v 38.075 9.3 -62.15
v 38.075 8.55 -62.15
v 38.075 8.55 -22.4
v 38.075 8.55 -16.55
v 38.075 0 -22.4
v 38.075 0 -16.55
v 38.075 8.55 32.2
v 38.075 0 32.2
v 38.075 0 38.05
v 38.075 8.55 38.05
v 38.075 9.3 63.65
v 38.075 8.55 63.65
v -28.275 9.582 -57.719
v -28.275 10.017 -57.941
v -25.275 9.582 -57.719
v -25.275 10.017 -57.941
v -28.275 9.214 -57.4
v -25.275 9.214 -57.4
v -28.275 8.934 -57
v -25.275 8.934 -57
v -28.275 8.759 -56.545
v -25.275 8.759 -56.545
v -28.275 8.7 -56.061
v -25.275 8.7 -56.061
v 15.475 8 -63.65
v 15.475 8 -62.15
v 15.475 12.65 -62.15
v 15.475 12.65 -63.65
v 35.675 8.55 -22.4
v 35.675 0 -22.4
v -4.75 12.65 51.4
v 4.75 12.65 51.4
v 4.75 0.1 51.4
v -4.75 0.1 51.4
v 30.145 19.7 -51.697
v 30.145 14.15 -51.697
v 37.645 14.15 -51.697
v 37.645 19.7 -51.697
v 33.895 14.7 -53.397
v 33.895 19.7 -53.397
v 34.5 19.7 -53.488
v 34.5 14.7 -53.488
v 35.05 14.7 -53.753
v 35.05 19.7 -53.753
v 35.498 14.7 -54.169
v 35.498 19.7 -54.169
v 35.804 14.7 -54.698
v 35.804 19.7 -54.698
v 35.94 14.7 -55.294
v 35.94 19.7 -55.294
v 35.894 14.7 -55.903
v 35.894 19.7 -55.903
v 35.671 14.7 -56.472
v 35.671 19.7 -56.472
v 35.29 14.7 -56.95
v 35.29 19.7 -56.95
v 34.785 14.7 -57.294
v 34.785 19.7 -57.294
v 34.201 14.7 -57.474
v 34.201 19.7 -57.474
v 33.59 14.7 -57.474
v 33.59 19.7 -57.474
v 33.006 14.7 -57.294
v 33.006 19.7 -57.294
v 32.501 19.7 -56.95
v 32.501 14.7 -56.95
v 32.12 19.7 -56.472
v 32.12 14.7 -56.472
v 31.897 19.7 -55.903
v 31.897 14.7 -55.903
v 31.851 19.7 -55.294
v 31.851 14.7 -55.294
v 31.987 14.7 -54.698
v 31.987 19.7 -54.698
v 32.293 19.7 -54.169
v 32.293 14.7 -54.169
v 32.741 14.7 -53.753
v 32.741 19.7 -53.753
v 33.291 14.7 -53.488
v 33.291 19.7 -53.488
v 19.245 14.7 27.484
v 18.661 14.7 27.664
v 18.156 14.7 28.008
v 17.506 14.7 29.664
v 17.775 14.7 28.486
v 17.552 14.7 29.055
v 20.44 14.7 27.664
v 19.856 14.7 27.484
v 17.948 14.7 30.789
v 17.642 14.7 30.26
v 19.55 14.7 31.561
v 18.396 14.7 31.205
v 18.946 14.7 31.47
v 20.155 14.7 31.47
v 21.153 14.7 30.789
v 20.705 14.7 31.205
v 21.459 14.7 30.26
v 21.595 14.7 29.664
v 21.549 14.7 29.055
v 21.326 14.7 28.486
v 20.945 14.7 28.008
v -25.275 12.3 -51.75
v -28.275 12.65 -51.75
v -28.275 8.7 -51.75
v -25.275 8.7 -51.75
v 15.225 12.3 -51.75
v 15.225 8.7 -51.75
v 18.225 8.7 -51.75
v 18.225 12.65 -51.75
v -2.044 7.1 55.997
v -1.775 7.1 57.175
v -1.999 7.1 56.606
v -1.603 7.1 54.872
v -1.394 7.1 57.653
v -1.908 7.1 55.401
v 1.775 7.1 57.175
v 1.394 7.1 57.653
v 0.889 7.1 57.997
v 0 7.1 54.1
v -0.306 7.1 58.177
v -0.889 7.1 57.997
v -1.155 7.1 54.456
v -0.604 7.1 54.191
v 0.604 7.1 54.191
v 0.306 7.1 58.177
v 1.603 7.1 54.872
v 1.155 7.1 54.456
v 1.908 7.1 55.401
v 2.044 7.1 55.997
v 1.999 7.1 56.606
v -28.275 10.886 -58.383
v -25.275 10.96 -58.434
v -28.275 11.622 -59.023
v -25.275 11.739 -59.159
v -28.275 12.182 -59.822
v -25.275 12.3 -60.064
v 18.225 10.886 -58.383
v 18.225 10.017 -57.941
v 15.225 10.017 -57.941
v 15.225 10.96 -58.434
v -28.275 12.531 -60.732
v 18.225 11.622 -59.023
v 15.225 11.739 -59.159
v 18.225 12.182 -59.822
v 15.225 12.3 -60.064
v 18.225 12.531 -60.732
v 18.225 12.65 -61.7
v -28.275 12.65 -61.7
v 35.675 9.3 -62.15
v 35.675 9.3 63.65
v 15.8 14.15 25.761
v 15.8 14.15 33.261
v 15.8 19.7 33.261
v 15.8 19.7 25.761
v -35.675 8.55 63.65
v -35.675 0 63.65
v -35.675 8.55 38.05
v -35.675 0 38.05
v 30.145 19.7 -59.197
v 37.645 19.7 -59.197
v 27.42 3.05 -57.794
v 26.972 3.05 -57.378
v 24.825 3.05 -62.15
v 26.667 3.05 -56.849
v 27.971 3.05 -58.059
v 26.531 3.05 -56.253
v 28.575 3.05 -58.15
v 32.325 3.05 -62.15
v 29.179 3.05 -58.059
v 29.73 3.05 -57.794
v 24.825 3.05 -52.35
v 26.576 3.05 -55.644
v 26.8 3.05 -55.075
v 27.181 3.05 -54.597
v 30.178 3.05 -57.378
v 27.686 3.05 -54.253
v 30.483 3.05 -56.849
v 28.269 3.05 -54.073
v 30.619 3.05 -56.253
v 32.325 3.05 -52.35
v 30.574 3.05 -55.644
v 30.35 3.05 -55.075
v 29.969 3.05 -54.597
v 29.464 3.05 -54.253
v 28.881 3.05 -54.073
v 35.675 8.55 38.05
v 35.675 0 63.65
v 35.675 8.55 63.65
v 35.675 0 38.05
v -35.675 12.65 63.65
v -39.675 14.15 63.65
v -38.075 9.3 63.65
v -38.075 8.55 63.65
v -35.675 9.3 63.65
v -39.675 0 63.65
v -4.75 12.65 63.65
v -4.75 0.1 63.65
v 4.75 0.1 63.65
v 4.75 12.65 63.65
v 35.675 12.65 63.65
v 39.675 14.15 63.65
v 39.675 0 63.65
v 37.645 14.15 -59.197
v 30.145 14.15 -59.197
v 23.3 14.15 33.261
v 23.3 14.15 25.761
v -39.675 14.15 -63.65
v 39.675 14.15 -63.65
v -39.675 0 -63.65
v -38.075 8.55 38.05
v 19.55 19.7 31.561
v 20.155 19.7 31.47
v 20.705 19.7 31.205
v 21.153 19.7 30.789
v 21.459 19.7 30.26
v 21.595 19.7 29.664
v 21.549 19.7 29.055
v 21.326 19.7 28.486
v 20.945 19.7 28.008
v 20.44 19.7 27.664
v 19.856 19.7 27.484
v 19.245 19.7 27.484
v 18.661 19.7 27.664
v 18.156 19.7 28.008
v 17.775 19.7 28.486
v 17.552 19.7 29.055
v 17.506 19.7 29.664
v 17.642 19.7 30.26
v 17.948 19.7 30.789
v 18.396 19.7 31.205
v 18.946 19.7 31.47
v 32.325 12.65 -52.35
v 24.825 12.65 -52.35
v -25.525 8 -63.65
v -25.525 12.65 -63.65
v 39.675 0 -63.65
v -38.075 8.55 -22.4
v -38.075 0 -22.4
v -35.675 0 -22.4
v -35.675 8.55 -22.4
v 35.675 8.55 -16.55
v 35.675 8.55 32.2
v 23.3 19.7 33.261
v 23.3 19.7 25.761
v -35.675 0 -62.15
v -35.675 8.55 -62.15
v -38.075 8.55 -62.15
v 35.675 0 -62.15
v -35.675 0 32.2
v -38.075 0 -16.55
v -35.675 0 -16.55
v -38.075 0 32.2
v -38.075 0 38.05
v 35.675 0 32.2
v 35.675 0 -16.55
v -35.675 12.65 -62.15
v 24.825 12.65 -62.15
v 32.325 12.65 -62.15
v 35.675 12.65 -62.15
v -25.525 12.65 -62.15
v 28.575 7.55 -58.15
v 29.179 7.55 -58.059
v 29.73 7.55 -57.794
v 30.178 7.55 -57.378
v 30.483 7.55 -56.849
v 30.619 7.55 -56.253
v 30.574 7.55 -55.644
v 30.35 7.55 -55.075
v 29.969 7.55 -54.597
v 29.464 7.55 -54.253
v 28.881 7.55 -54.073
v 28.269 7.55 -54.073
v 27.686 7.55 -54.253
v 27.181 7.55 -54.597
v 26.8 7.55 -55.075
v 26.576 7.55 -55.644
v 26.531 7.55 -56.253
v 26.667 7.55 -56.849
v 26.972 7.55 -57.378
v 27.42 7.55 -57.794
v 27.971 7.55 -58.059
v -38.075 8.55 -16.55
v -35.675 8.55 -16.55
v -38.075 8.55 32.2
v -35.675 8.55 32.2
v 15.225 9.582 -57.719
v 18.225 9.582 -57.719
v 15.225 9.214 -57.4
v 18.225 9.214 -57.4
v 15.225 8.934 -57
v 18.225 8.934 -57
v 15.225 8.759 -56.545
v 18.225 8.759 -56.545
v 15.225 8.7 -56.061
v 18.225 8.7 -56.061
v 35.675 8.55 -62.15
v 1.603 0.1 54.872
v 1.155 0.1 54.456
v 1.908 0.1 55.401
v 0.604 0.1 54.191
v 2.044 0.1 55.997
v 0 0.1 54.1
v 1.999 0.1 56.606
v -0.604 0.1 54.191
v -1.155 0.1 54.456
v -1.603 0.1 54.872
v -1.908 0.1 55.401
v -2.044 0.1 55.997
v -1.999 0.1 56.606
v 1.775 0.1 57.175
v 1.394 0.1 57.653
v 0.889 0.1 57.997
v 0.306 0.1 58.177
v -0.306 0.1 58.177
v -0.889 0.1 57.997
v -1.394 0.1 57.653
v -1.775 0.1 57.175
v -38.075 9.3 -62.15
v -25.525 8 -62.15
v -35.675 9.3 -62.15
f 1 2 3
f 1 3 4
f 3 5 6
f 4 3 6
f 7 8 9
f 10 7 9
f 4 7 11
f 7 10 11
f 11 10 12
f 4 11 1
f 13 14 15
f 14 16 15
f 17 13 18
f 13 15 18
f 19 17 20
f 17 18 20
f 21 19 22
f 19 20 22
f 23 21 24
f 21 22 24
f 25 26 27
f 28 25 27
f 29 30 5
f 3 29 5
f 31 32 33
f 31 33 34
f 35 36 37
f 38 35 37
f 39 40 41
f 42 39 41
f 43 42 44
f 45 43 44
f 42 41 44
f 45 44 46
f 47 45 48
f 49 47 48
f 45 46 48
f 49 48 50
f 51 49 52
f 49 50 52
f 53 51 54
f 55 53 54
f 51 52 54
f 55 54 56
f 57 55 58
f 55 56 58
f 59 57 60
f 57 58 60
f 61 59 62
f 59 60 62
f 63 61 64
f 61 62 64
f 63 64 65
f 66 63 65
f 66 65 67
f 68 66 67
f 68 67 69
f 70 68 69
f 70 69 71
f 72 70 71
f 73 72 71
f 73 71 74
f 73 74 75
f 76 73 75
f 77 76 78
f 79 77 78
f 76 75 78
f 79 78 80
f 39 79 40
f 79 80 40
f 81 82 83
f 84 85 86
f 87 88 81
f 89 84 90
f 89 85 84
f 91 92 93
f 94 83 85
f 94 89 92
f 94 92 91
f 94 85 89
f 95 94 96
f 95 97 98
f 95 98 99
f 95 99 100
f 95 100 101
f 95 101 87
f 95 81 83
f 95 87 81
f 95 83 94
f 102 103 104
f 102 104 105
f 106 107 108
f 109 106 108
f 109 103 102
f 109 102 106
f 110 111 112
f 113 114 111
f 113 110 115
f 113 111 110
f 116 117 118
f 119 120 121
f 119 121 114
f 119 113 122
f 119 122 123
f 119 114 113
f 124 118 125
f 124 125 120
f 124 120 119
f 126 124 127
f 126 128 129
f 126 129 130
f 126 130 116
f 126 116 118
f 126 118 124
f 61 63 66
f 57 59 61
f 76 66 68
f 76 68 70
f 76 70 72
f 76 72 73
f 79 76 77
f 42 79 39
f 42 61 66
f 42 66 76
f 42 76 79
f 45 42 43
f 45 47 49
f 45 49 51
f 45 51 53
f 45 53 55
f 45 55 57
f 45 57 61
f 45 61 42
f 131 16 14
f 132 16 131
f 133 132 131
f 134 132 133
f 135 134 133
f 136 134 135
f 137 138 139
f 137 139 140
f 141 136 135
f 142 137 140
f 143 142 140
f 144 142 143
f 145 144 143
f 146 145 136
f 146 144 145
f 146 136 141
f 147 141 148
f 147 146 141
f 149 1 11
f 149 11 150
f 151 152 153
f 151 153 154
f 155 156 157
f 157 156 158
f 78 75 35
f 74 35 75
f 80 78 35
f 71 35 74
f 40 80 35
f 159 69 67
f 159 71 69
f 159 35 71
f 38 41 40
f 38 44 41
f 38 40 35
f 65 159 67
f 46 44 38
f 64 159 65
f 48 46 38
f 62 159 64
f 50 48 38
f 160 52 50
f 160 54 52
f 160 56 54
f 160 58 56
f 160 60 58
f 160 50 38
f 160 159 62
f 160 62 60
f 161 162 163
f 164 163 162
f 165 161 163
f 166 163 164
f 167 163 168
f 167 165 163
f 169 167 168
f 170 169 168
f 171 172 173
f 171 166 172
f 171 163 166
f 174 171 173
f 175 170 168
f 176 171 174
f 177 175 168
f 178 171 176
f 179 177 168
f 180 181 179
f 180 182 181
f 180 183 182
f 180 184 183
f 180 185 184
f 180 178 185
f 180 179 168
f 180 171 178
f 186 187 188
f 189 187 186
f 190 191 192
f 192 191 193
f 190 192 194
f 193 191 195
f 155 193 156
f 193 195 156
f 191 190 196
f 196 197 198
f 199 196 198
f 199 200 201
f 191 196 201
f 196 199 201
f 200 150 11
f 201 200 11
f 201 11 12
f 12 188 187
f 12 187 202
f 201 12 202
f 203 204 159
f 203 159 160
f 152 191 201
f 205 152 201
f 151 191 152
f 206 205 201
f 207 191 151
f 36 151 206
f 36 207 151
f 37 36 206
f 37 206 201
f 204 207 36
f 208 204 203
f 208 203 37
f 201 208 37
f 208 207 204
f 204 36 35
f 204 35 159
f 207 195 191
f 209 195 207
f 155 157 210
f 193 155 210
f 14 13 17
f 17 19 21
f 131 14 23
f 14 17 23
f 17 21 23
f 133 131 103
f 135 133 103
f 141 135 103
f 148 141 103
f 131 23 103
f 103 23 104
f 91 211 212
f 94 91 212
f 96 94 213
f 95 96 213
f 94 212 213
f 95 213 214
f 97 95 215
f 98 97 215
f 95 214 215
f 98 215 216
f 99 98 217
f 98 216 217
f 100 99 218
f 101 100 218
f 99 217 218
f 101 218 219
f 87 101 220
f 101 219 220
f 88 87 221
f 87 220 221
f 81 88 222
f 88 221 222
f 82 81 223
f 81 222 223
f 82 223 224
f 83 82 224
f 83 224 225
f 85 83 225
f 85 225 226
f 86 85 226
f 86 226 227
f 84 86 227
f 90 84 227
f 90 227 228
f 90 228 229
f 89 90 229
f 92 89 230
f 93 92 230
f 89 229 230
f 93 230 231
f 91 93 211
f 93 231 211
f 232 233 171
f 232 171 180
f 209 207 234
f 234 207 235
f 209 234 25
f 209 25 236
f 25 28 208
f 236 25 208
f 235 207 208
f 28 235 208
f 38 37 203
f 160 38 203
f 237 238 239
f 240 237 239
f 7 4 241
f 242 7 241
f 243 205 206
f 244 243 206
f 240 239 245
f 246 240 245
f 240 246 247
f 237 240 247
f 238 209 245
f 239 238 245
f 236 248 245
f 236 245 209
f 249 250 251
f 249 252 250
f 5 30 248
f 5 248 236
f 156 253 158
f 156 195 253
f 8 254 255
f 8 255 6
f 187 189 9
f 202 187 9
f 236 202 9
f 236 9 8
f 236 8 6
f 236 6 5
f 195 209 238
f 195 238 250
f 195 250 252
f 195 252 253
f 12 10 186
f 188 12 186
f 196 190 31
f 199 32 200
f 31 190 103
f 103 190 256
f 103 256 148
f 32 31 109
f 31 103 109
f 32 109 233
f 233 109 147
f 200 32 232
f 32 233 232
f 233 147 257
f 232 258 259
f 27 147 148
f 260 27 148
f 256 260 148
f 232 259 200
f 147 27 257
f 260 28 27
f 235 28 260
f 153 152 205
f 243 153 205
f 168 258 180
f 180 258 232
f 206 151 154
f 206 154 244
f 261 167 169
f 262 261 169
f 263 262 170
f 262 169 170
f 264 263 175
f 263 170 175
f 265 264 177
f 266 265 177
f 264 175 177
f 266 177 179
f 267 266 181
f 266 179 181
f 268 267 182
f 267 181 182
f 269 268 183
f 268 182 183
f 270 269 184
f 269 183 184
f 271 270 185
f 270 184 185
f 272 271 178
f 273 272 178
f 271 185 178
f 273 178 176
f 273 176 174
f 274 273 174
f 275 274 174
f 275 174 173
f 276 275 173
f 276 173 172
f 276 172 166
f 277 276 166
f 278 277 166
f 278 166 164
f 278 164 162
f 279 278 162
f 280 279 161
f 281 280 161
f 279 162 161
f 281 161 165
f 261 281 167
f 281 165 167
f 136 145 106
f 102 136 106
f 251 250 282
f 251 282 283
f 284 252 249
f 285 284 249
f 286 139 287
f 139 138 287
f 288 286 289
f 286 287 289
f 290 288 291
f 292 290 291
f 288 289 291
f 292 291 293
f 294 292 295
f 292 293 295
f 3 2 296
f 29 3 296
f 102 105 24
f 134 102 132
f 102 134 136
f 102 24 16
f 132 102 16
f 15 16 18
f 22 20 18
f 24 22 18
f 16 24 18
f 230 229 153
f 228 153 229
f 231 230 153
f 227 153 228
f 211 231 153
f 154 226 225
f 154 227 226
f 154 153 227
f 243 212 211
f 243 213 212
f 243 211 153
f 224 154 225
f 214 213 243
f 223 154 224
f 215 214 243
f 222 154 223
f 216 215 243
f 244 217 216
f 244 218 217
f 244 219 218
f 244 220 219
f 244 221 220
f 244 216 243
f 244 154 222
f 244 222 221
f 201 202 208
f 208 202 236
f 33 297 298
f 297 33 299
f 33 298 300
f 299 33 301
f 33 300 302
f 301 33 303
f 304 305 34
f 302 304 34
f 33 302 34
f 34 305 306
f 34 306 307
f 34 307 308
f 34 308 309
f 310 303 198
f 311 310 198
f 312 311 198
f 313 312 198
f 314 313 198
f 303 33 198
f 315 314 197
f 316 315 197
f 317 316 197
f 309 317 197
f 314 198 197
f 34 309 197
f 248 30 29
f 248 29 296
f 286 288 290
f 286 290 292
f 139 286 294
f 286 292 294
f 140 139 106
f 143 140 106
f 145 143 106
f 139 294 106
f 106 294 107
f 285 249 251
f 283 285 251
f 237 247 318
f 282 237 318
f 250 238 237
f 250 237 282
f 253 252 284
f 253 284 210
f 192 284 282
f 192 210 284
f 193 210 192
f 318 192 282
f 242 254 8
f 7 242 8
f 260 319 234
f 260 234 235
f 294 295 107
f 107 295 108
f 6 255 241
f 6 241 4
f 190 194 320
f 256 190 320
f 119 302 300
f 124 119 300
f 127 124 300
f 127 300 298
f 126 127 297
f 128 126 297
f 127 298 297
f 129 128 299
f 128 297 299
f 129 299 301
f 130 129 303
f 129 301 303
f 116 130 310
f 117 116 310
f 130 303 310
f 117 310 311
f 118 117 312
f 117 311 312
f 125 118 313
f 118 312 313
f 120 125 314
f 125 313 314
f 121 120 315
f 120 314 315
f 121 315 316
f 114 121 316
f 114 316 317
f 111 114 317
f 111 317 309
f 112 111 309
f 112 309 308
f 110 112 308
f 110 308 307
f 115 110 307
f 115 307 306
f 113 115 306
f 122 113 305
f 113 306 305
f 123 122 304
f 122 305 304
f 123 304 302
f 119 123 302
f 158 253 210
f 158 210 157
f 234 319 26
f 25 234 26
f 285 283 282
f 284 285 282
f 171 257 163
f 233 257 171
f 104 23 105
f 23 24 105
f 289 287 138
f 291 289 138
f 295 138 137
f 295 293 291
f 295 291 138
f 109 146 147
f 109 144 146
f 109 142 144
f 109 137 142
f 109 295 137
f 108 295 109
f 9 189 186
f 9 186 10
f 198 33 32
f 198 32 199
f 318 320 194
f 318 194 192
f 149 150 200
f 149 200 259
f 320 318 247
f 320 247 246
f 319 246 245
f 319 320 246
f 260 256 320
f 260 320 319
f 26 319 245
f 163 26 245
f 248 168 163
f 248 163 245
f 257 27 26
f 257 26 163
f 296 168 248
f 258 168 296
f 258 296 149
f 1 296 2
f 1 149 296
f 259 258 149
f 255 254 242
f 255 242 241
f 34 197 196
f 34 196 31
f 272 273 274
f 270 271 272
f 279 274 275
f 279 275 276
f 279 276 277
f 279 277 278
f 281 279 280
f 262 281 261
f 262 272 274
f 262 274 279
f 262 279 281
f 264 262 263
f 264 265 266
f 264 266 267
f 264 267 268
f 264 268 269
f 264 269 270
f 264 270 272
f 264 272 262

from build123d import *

# Parameters (mm, degrees)
SKETCH_1_W          = 4
SKETCH_1_H          = 127.3
EXTRUDE_1_DEPTH     = 12.65
EXTRUDE_1_2_DEPTH   = 12.65
SKETCH_2_W          = 79.35
SKETCH_2_H          = 127.3
EXTRUDE_2_DEPTH     = 1.5
CUT_EXTRUDE_START   = -1.5
SKETCH_3_W          = 2.4
SKETCH_3_H          = 0.75
CUT_EXTRUDE_1_DEPTH = 133.588098372
SKETCH_4_W          = 71.35
SKETCH_4_H          = 1.5
EXTRUDE_3_DEPTH     = 12.65
SKETCH_6_W          = 7.5
SKETCH_6_H          = 9.8
EXTRUDE_5_DEPTH     = 9.6
SKETCH_7_R          = 2.05
CUT_EXTRUDE_2_DEPTH = 4.5
SKETCH_8_W          = 2.4
SKETCH_8_H          = 5.85
CUT_EXTRUDE_3_DEPTH = 8.55
SKETCH_10_W         = 3
SKETCH_10_H         = 5.95
EXTRUDE_6_DEPTH     = 3.95
SKETCH_11_W         = 40.5
SKETCH_11_H         = 5.95
EXTRUDE_7_DEPTH     = 0.35
FILLET_4_R          = 4
FILLET_5_R          = 2
SKETCH_12_W         = 41
SKETCH_12_H         = 4.65
CUT_EXTRUDE_4_DEPTH = 133.664871481
EXTRUDE_8_DEPTH     = 12.55
SKETCH_14_R         = 2.05
CUT_EXTRUDE_5_DEPTH = 7
SKETCH_15_W         = 7.5
SKETCH_15_H         = 7.5
EXTRUDE_9_DEPTH     = 5.55
SKETCH_16_R         = 2.05
CUT_EXTRUDE_6_DEPTH = 5


with BuildPart() as part:
    # Эскиз1 → Бобышка-Вытянуть1 (new body)
    with BuildSketch(Plane(origin=(0, 0, 0), x_dir=(1, 0, 0), z_dir=(0, 1, 0))):
        with Locations((37.675, 0)):
            Rectangle(SKETCH_1_W, SKETCH_1_H)
    extrude(amount=EXTRUDE_1_DEPTH)



with BuildPart() as body_2:
    # Эскиз1 → Extrude 1 2 (new body)
    with BuildSketch(Plane(origin=(0, 0, 0), x_dir=(1, 0, 0), z_dir=(0, 1, 0))):
        with Locations((-37.675, 0)):
            Rectangle(SKETCH_1_W, SKETCH_1_H)
    extrude(amount=EXTRUDE_1_2_DEPTH)


with BuildPart() as part_1:
    add(part.part)

    add(body_2.part)  # Бобышка-Вытянуть2 merges body 2
    # Эскиз2 → Бобышка-Вытянуть2 (add)
    with BuildSketch(Plane(origin=(0, 12.65, 0), x_dir=(1, 0, 0), z_dir=(0, 1, 0))):
        Rectangle(SKETCH_2_W, SKETCH_2_H)
    extrude(amount=EXTRUDE_2_DEPTH)

    # Эскиз3 → Вырез-Вытянуть1 (cut, through all)
    with BuildSketch(Plane(origin=(0, 0, -63.65), x_dir=(-1, 0, 0), z_dir=(0, 0, -1)).offset(CUT_EXTRUDE_START)):
        with Locations((-36.875, 8.925)):
            Rectangle(SKETCH_3_W, SKETCH_3_H)
        with Locations((36.875, 8.925)):
            Rectangle(SKETCH_3_W, SKETCH_3_H)
    extrude(amount=-CUT_EXTRUDE_1_DEPTH, mode=Mode.SUBTRACT)

    # Эскиз4 → Бобышка-Вытянуть3 (add)
    with BuildSketch(Plane.XZ.offset(-12.65)):
        with Locations((0, -62.9)):
            Rectangle(SKETCH_4_W, SKETCH_4_H)
    extrude(amount=EXTRUDE_3_DEPTH)

    # Эскиз6 → Бобышка-Вытянуть5 (add)
    with BuildSketch(Plane.XZ.offset(-12.65)):
        with Locations((28.575, -57.25)):
            Rectangle(SKETCH_6_W, SKETCH_6_H)
    extrude(amount=EXTRUDE_5_DEPTH)

    # Эскиз7 → Вырез-Вытянуть2 (cut)
    with BuildSketch(Plane.XZ.offset(-3.05)):
        with Locations(Location((28.575, -56.1, 0), (0, 0, 270))):
            Circle(SKETCH_7_R)
    extrude(amount=-CUT_EXTRUDE_2_DEPTH, mode=Mode.SUBTRACT)

    # Эскиз8 → Вырез-Вытянуть3 (cut)
    with BuildSketch(Plane.XZ):
        with Locations((-36.875, 35.125)):
            Rectangle(SKETCH_8_W, SKETCH_8_H)
        with Locations((-36.875, -19.475)):
            Rectangle(SKETCH_8_W, SKETCH_8_H)
        with Locations((36.875, -19.475)):
            Rectangle(SKETCH_8_W, SKETCH_8_H)
        with Locations((36.875, 35.125)):
            Rectangle(SKETCH_8_W, SKETCH_8_H)
    extrude(amount=-CUT_EXTRUDE_3_DEPTH, mode=Mode.SUBTRACT)

    # Эскиз10 → Бобышка-Вытянуть6 (add)
    with BuildSketch(Plane.XZ.offset(-12.65)):
        with Locations((-26.775, -54.725)):
            Rectangle(SKETCH_10_W, SKETCH_10_H)
        with Locations((16.725, -54.725)):
            Rectangle(SKETCH_10_W, SKETCH_10_H)
    extrude(amount=EXTRUDE_6_DEPTH)

    # Эскиз11 → Бобышка-Вытянуть7 (add)
    with BuildSketch(Plane.XZ.offset(-12.65)):
        with Locations((-5.025, -54.725)):
            Rectangle(SKETCH_11_W, SKETCH_11_H)
    extrude(amount=EXTRUDE_7_DEPTH)

    # Скругление4
    # the kernel refuses this fillet: 4 mm, written as the material it adds along each edge
    with BuildSketch(Plane(origin=(18.225, 12.65, -57.7), x_dir=(0, 0, -1), z_dir=(-1, 0, 0))) as fillet_4_piece_1_section:
        with BuildLine():
            CenterArc((FILLET_4_R, FILLET_4_R), FILLET_4_R, 180, 90)
            Line((0, FILLET_4_R), (0, 0))
            Line((0, 0), (FILLET_4_R, 0))
        make_face()
    fillet_4_piece_1 = extrude(amount=46.5, mode=Mode.PRIVATE)
    fillet_4_piece_1 = split(fillet_4_piece_1, bisect_by=Plane(origin=(15.225, 12.535953676, -59.259664423), z_dir=(1, 0, 0)), keep=Keep.TOP, mode=Mode.PRIVATE)
    fillet_4_piece_1 = split(fillet_4_piece_1, bisect_by=Plane(origin=(16.725, 12.3, -59.259664423), z_dir=(0, 1, 0)), keep=Keep.TOP, mode=Mode.PRIVATE)
    add(fillet_4_piece_1)
    with BuildSketch(Plane(origin=(18.225, 12.65, -57.7), x_dir=(0, 0, -1), z_dir=(-1, 0, 0))) as fillet_4_piece_2_section:
        with BuildLine():
            CenterArc((FILLET_4_R, FILLET_4_R), FILLET_4_R, 180, 90)
            Line((0, FILLET_4_R), (0, 0))
            Line((0, 0), (FILLET_4_R, 0))
        make_face()
    fillet_4_piece_2 = extrude(amount=46.5, mode=Mode.PRIVATE)
    fillet_4_piece_2 = split(fillet_4_piece_2, bisect_by=Plane(origin=(16.725, 8.7, -58.276150153), z_dir=(0, 1, 0)), keep=Keep.TOP, mode=Mode.PRIVATE)
    fillet_4_piece_2 = split(fillet_4_piece_2, bisect_by=Plane(origin=(15.225, 11.348610823, -58.276150153), z_dir=(1, 0, 0)), keep=Keep.TOP, mode=Mode.PRIVATE)
    fillet_4_piece_2 = split(fillet_4_piece_2, bisect_by=Plane(origin=(16.725, 12.3, -58.276150153), z_dir=(0, -1, 0)), keep=Keep.TOP, mode=Mode.PRIVATE)
    add(fillet_4_piece_2)
    with BuildSketch(Plane(origin=(18.225, 12.65, -57.7), x_dir=(0, 0, -1), z_dir=(-1, 0, 0))) as fillet_4_piece_3_section:
        with BuildLine():
            CenterArc((FILLET_4_R, FILLET_4_R), FILLET_4_R, 180, 90)
            Line((0, FILLET_4_R), (0, 0))
            Line((0, 0), (FILLET_4_R, 0))
        make_face()
    fillet_4_piece_3 = extrude(amount=46.5, mode=Mode.PRIVATE)
    fillet_4_piece_3 = split(fillet_4_piece_3, bisect_by=Plane(origin=(15.225, 12.535953676, -59.259664423), z_dir=(-1, 0, 0)), keep=Keep.TOP, mode=Mode.PRIVATE)
    fillet_4_piece_3 = split(fillet_4_piece_3, bisect_by=Plane(origin=(-5.025, 12.3, -59.259664423), z_dir=(0, 1, 0)), keep=Keep.TOP, mode=Mode.PRIVATE)
    fillet_4_piece_3 = split(fillet_4_piece_3, bisect_by=Plane(origin=(-25.275, 12.535953676, -59.259664423), z_dir=(1, 0, 0)), keep=Keep.TOP, mode=Mode.PRIVATE)
    add(fillet_4_piece_3)
    with BuildSketch(Plane(origin=(18.225, 12.65, -57.7), x_dir=(0, 0, -1), z_dir=(-1, 0, 0))) as fillet_4_piece_4_section:
        with BuildLine():
            CenterArc((FILLET_4_R, FILLET_4_R), FILLET_4_R, 180, 90)
            Line((0, FILLET_4_R), (0, 0))
            Line((0, 0), (FILLET_4_R, 0))
        make_face()
    fillet_4_piece_4 = extrude(amount=46.5, mode=Mode.PRIVATE)
    fillet_4_piece_4 = split(fillet_4_piece_4, bisect_by=Plane(origin=(-26.775, 12.3, -59.259664423), z_dir=(0, 1, 0)), keep=Keep.TOP, mode=Mode.PRIVATE)
    fillet_4_piece_4 = split(fillet_4_piece_4, bisect_by=Plane(origin=(-25.275, 12.535953676, -59.259664423), z_dir=(-1, 0, 0)), keep=Keep.TOP, mode=Mode.PRIVATE)
    add(fillet_4_piece_4)
    with BuildSketch(Plane(origin=(18.225, 12.65, -57.7), x_dir=(0, 0, -1), z_dir=(-1, 0, 0))) as fillet_4_piece_5_section:
        with BuildLine():
            CenterArc((FILLET_4_R, FILLET_4_R), FILLET_4_R, 180, 90)
            Line((0, FILLET_4_R), (0, 0))
            Line((0, 0), (FILLET_4_R, 0))
        make_face()
    fillet_4_piece_5 = extrude(amount=46.5, mode=Mode.PRIVATE)
    fillet_4_piece_5 = split(fillet_4_piece_5, bisect_by=Plane(origin=(-26.775, 8.7, -58.276150153), z_dir=(0, 1, 0)), keep=Keep.TOP, mode=Mode.PRIVATE)
    fillet_4_piece_5 = split(fillet_4_piece_5, bisect_by=Plane(origin=(-26.775, 12.3, -58.276150153), z_dir=(0, -1, 0)), keep=Keep.TOP, mode=Mode.PRIVATE)
    fillet_4_piece_5 = split(fillet_4_piece_5, bisect_by=Plane(origin=(-25.275, 11.348610823, -58.276150153), z_dir=(-1, 0, 0)), keep=Keep.TOP, mode=Mode.PRIVATE)
    add(fillet_4_piece_5)

    # Скругление5
    fillet_5_edges = [part_1.edges().sort_by_distance(p)[0] for p in [
        (-26.775, 8.7, -57.700312512),
        (16.725, 8.7, -57.700312512),
    ]]
    fillet(fillet_5_edges, radius=FILLET_5_R)

    # Эскиз12 → Вырез-Вытянуть4 (cut, through all)
    with BuildSketch(Plane.XY.offset(-62.15)):
        with Locations((-5.025, 10.325)):
            Rectangle(SKETCH_12_W, SKETCH_12_H)
    extrude(amount=-CUT_EXTRUDE_4_DEPTH, mode=Mode.SUBTRACT)

    # Эскиз13 → Бобышка-Вытянуть8 (add)
    with BuildSketch(Plane.XZ.offset(-12.65)):
        Polygon((-4.75, 60.9), (-4.75, 63.65), (4.75, 63.65), (4.75, 60.9), (4.75, 51.4), (-4.75, 51.4), align=None)
    extrude(amount=EXTRUDE_8_DEPTH)

    # Эскиз14 → Вырез-Вытянуть5 (cut)
    with BuildSketch(Plane.XZ.offset(-0.1)):
        with Locations(Location((0, 56.15, 0), (0, 0, 270))):
            Circle(SKETCH_14_R)
    extrude(amount=-CUT_EXTRUDE_5_DEPTH, mode=Mode.SUBTRACT)

    # Эскиз15 → Бобышка-Вытянуть9 (add)
    with BuildSketch(Plane(origin=(0, 14.15, 0), x_dir=(1, 0, 0), z_dir=(0, 1, 0))):
        with Locations((33.89536, 55.44709)):
            Rectangle(SKETCH_15_W, SKETCH_15_H)
        with Locations((19.55046, -29.51121)):
            Rectangle(SKETCH_15_W, SKETCH_15_H)
    extrude(amount=EXTRUDE_9_DEPTH)

    # Эскиз16 → Вырез-Вытянуть6 (cut)
    with BuildSketch(Plane(origin=(0, 19.7, 0), x_dir=(1, 0, 0), z_dir=(0, 1, 0))):
        with Locations(Location((19.55046, -29.51121, 0), (0, 0, 270))):
            Circle(SKETCH_16_R)
        with Locations(Location((33.89536, 55.44709, 0), (0, 0, 270))):
            Circle(SKETCH_16_R)
    extrude(amount=-CUT_EXTRUDE_6_DEPTH, mode=Mode.SUBTRACT)


solid = part_1.part
